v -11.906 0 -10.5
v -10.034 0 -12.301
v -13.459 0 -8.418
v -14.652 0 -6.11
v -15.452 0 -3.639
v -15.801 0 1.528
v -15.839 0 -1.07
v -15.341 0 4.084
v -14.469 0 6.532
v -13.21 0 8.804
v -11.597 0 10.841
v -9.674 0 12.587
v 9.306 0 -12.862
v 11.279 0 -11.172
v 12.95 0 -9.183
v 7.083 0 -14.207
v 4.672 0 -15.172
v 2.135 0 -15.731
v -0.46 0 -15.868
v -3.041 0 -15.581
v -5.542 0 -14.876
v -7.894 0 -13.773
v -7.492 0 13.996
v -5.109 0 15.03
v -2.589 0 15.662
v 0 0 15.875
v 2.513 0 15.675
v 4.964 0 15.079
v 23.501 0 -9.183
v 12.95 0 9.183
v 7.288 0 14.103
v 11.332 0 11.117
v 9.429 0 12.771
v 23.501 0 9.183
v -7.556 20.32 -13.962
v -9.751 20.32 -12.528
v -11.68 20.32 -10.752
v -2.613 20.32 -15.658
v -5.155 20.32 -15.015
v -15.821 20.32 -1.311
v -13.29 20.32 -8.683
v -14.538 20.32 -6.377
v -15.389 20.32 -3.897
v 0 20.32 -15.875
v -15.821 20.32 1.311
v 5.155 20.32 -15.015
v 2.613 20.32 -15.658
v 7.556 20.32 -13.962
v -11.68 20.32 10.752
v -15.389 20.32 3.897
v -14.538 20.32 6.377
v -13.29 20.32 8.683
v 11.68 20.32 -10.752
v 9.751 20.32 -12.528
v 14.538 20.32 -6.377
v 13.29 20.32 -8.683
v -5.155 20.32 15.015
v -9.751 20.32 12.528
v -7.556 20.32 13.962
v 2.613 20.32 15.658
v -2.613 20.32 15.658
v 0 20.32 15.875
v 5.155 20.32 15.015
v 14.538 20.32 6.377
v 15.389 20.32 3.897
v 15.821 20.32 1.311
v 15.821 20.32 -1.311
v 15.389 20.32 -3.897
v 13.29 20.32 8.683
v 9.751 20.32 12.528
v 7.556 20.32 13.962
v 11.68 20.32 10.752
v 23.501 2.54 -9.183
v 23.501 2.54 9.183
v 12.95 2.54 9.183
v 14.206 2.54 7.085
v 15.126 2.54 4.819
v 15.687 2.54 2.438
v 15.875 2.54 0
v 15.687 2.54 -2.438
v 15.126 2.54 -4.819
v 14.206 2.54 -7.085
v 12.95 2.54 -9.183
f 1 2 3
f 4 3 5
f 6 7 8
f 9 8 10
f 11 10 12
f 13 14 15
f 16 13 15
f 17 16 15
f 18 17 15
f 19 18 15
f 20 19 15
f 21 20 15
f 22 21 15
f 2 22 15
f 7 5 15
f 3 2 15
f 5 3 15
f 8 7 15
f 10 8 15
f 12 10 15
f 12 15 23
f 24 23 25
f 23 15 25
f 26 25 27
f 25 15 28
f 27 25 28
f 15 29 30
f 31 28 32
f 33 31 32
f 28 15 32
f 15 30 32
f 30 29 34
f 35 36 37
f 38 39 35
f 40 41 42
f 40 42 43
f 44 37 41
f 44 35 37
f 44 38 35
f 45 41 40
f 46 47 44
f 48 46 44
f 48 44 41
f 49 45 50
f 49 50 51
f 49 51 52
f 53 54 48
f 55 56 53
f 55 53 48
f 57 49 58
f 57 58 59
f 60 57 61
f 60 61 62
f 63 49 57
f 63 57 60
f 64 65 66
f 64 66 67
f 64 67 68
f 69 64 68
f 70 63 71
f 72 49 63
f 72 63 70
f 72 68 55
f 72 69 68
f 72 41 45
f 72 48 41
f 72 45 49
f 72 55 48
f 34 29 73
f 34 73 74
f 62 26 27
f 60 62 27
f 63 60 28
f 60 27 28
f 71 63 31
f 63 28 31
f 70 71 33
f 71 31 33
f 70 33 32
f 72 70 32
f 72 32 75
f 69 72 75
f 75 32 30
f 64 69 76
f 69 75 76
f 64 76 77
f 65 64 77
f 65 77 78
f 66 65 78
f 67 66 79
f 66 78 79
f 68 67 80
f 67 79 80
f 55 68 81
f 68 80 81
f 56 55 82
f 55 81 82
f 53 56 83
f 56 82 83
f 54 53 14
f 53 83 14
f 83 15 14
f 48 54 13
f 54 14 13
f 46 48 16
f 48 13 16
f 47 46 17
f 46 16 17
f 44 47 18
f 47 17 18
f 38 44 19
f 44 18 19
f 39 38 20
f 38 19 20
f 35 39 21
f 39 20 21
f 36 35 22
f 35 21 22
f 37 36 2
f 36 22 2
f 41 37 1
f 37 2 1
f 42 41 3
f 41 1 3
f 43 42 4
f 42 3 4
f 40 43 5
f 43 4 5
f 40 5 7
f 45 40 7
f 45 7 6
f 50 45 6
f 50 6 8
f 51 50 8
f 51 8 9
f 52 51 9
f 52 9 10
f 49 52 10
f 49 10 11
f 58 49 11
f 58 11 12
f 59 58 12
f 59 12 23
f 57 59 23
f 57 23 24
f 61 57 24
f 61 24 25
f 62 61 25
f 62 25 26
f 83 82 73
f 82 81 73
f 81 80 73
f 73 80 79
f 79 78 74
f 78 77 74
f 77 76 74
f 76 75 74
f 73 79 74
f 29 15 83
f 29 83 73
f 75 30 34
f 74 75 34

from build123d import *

# Parameters (mm, degrees)
SKETCH1_R           = 15.875
BOSS_EXTRUDE1_DEPTH = 20.32
SKETCH2_W           = 15.252884162
SKETCH2_H           = 18.365256134
BOSS_EXTRUDE2_DEPTH = 2.54


with BuildPart() as part:
    # Sketch1 → Boss-Extrude1 (new body)
    with BuildSketch(Plane(origin=(0, 0, 0), x_dir=(1, 0, 0), z_dir=(0, 1, 0))):
        with Locations(Location((0, 0, 0), (0, 0, 270))):
            Circle(SKETCH1_R)
    extrude(amount=BOSS_EXTRUDE1_DEPTH)

    # Sketch2 → Boss-Extrude2 (add)
    with BuildSketch(Plane.XZ):
        with Locations((15.875, 0)):
            Rectangle(SKETCH2_W, SKETCH2_H)
    extrude(amount=-BOSS_EXTRUDE2_DEPTH)


solid = part.part
